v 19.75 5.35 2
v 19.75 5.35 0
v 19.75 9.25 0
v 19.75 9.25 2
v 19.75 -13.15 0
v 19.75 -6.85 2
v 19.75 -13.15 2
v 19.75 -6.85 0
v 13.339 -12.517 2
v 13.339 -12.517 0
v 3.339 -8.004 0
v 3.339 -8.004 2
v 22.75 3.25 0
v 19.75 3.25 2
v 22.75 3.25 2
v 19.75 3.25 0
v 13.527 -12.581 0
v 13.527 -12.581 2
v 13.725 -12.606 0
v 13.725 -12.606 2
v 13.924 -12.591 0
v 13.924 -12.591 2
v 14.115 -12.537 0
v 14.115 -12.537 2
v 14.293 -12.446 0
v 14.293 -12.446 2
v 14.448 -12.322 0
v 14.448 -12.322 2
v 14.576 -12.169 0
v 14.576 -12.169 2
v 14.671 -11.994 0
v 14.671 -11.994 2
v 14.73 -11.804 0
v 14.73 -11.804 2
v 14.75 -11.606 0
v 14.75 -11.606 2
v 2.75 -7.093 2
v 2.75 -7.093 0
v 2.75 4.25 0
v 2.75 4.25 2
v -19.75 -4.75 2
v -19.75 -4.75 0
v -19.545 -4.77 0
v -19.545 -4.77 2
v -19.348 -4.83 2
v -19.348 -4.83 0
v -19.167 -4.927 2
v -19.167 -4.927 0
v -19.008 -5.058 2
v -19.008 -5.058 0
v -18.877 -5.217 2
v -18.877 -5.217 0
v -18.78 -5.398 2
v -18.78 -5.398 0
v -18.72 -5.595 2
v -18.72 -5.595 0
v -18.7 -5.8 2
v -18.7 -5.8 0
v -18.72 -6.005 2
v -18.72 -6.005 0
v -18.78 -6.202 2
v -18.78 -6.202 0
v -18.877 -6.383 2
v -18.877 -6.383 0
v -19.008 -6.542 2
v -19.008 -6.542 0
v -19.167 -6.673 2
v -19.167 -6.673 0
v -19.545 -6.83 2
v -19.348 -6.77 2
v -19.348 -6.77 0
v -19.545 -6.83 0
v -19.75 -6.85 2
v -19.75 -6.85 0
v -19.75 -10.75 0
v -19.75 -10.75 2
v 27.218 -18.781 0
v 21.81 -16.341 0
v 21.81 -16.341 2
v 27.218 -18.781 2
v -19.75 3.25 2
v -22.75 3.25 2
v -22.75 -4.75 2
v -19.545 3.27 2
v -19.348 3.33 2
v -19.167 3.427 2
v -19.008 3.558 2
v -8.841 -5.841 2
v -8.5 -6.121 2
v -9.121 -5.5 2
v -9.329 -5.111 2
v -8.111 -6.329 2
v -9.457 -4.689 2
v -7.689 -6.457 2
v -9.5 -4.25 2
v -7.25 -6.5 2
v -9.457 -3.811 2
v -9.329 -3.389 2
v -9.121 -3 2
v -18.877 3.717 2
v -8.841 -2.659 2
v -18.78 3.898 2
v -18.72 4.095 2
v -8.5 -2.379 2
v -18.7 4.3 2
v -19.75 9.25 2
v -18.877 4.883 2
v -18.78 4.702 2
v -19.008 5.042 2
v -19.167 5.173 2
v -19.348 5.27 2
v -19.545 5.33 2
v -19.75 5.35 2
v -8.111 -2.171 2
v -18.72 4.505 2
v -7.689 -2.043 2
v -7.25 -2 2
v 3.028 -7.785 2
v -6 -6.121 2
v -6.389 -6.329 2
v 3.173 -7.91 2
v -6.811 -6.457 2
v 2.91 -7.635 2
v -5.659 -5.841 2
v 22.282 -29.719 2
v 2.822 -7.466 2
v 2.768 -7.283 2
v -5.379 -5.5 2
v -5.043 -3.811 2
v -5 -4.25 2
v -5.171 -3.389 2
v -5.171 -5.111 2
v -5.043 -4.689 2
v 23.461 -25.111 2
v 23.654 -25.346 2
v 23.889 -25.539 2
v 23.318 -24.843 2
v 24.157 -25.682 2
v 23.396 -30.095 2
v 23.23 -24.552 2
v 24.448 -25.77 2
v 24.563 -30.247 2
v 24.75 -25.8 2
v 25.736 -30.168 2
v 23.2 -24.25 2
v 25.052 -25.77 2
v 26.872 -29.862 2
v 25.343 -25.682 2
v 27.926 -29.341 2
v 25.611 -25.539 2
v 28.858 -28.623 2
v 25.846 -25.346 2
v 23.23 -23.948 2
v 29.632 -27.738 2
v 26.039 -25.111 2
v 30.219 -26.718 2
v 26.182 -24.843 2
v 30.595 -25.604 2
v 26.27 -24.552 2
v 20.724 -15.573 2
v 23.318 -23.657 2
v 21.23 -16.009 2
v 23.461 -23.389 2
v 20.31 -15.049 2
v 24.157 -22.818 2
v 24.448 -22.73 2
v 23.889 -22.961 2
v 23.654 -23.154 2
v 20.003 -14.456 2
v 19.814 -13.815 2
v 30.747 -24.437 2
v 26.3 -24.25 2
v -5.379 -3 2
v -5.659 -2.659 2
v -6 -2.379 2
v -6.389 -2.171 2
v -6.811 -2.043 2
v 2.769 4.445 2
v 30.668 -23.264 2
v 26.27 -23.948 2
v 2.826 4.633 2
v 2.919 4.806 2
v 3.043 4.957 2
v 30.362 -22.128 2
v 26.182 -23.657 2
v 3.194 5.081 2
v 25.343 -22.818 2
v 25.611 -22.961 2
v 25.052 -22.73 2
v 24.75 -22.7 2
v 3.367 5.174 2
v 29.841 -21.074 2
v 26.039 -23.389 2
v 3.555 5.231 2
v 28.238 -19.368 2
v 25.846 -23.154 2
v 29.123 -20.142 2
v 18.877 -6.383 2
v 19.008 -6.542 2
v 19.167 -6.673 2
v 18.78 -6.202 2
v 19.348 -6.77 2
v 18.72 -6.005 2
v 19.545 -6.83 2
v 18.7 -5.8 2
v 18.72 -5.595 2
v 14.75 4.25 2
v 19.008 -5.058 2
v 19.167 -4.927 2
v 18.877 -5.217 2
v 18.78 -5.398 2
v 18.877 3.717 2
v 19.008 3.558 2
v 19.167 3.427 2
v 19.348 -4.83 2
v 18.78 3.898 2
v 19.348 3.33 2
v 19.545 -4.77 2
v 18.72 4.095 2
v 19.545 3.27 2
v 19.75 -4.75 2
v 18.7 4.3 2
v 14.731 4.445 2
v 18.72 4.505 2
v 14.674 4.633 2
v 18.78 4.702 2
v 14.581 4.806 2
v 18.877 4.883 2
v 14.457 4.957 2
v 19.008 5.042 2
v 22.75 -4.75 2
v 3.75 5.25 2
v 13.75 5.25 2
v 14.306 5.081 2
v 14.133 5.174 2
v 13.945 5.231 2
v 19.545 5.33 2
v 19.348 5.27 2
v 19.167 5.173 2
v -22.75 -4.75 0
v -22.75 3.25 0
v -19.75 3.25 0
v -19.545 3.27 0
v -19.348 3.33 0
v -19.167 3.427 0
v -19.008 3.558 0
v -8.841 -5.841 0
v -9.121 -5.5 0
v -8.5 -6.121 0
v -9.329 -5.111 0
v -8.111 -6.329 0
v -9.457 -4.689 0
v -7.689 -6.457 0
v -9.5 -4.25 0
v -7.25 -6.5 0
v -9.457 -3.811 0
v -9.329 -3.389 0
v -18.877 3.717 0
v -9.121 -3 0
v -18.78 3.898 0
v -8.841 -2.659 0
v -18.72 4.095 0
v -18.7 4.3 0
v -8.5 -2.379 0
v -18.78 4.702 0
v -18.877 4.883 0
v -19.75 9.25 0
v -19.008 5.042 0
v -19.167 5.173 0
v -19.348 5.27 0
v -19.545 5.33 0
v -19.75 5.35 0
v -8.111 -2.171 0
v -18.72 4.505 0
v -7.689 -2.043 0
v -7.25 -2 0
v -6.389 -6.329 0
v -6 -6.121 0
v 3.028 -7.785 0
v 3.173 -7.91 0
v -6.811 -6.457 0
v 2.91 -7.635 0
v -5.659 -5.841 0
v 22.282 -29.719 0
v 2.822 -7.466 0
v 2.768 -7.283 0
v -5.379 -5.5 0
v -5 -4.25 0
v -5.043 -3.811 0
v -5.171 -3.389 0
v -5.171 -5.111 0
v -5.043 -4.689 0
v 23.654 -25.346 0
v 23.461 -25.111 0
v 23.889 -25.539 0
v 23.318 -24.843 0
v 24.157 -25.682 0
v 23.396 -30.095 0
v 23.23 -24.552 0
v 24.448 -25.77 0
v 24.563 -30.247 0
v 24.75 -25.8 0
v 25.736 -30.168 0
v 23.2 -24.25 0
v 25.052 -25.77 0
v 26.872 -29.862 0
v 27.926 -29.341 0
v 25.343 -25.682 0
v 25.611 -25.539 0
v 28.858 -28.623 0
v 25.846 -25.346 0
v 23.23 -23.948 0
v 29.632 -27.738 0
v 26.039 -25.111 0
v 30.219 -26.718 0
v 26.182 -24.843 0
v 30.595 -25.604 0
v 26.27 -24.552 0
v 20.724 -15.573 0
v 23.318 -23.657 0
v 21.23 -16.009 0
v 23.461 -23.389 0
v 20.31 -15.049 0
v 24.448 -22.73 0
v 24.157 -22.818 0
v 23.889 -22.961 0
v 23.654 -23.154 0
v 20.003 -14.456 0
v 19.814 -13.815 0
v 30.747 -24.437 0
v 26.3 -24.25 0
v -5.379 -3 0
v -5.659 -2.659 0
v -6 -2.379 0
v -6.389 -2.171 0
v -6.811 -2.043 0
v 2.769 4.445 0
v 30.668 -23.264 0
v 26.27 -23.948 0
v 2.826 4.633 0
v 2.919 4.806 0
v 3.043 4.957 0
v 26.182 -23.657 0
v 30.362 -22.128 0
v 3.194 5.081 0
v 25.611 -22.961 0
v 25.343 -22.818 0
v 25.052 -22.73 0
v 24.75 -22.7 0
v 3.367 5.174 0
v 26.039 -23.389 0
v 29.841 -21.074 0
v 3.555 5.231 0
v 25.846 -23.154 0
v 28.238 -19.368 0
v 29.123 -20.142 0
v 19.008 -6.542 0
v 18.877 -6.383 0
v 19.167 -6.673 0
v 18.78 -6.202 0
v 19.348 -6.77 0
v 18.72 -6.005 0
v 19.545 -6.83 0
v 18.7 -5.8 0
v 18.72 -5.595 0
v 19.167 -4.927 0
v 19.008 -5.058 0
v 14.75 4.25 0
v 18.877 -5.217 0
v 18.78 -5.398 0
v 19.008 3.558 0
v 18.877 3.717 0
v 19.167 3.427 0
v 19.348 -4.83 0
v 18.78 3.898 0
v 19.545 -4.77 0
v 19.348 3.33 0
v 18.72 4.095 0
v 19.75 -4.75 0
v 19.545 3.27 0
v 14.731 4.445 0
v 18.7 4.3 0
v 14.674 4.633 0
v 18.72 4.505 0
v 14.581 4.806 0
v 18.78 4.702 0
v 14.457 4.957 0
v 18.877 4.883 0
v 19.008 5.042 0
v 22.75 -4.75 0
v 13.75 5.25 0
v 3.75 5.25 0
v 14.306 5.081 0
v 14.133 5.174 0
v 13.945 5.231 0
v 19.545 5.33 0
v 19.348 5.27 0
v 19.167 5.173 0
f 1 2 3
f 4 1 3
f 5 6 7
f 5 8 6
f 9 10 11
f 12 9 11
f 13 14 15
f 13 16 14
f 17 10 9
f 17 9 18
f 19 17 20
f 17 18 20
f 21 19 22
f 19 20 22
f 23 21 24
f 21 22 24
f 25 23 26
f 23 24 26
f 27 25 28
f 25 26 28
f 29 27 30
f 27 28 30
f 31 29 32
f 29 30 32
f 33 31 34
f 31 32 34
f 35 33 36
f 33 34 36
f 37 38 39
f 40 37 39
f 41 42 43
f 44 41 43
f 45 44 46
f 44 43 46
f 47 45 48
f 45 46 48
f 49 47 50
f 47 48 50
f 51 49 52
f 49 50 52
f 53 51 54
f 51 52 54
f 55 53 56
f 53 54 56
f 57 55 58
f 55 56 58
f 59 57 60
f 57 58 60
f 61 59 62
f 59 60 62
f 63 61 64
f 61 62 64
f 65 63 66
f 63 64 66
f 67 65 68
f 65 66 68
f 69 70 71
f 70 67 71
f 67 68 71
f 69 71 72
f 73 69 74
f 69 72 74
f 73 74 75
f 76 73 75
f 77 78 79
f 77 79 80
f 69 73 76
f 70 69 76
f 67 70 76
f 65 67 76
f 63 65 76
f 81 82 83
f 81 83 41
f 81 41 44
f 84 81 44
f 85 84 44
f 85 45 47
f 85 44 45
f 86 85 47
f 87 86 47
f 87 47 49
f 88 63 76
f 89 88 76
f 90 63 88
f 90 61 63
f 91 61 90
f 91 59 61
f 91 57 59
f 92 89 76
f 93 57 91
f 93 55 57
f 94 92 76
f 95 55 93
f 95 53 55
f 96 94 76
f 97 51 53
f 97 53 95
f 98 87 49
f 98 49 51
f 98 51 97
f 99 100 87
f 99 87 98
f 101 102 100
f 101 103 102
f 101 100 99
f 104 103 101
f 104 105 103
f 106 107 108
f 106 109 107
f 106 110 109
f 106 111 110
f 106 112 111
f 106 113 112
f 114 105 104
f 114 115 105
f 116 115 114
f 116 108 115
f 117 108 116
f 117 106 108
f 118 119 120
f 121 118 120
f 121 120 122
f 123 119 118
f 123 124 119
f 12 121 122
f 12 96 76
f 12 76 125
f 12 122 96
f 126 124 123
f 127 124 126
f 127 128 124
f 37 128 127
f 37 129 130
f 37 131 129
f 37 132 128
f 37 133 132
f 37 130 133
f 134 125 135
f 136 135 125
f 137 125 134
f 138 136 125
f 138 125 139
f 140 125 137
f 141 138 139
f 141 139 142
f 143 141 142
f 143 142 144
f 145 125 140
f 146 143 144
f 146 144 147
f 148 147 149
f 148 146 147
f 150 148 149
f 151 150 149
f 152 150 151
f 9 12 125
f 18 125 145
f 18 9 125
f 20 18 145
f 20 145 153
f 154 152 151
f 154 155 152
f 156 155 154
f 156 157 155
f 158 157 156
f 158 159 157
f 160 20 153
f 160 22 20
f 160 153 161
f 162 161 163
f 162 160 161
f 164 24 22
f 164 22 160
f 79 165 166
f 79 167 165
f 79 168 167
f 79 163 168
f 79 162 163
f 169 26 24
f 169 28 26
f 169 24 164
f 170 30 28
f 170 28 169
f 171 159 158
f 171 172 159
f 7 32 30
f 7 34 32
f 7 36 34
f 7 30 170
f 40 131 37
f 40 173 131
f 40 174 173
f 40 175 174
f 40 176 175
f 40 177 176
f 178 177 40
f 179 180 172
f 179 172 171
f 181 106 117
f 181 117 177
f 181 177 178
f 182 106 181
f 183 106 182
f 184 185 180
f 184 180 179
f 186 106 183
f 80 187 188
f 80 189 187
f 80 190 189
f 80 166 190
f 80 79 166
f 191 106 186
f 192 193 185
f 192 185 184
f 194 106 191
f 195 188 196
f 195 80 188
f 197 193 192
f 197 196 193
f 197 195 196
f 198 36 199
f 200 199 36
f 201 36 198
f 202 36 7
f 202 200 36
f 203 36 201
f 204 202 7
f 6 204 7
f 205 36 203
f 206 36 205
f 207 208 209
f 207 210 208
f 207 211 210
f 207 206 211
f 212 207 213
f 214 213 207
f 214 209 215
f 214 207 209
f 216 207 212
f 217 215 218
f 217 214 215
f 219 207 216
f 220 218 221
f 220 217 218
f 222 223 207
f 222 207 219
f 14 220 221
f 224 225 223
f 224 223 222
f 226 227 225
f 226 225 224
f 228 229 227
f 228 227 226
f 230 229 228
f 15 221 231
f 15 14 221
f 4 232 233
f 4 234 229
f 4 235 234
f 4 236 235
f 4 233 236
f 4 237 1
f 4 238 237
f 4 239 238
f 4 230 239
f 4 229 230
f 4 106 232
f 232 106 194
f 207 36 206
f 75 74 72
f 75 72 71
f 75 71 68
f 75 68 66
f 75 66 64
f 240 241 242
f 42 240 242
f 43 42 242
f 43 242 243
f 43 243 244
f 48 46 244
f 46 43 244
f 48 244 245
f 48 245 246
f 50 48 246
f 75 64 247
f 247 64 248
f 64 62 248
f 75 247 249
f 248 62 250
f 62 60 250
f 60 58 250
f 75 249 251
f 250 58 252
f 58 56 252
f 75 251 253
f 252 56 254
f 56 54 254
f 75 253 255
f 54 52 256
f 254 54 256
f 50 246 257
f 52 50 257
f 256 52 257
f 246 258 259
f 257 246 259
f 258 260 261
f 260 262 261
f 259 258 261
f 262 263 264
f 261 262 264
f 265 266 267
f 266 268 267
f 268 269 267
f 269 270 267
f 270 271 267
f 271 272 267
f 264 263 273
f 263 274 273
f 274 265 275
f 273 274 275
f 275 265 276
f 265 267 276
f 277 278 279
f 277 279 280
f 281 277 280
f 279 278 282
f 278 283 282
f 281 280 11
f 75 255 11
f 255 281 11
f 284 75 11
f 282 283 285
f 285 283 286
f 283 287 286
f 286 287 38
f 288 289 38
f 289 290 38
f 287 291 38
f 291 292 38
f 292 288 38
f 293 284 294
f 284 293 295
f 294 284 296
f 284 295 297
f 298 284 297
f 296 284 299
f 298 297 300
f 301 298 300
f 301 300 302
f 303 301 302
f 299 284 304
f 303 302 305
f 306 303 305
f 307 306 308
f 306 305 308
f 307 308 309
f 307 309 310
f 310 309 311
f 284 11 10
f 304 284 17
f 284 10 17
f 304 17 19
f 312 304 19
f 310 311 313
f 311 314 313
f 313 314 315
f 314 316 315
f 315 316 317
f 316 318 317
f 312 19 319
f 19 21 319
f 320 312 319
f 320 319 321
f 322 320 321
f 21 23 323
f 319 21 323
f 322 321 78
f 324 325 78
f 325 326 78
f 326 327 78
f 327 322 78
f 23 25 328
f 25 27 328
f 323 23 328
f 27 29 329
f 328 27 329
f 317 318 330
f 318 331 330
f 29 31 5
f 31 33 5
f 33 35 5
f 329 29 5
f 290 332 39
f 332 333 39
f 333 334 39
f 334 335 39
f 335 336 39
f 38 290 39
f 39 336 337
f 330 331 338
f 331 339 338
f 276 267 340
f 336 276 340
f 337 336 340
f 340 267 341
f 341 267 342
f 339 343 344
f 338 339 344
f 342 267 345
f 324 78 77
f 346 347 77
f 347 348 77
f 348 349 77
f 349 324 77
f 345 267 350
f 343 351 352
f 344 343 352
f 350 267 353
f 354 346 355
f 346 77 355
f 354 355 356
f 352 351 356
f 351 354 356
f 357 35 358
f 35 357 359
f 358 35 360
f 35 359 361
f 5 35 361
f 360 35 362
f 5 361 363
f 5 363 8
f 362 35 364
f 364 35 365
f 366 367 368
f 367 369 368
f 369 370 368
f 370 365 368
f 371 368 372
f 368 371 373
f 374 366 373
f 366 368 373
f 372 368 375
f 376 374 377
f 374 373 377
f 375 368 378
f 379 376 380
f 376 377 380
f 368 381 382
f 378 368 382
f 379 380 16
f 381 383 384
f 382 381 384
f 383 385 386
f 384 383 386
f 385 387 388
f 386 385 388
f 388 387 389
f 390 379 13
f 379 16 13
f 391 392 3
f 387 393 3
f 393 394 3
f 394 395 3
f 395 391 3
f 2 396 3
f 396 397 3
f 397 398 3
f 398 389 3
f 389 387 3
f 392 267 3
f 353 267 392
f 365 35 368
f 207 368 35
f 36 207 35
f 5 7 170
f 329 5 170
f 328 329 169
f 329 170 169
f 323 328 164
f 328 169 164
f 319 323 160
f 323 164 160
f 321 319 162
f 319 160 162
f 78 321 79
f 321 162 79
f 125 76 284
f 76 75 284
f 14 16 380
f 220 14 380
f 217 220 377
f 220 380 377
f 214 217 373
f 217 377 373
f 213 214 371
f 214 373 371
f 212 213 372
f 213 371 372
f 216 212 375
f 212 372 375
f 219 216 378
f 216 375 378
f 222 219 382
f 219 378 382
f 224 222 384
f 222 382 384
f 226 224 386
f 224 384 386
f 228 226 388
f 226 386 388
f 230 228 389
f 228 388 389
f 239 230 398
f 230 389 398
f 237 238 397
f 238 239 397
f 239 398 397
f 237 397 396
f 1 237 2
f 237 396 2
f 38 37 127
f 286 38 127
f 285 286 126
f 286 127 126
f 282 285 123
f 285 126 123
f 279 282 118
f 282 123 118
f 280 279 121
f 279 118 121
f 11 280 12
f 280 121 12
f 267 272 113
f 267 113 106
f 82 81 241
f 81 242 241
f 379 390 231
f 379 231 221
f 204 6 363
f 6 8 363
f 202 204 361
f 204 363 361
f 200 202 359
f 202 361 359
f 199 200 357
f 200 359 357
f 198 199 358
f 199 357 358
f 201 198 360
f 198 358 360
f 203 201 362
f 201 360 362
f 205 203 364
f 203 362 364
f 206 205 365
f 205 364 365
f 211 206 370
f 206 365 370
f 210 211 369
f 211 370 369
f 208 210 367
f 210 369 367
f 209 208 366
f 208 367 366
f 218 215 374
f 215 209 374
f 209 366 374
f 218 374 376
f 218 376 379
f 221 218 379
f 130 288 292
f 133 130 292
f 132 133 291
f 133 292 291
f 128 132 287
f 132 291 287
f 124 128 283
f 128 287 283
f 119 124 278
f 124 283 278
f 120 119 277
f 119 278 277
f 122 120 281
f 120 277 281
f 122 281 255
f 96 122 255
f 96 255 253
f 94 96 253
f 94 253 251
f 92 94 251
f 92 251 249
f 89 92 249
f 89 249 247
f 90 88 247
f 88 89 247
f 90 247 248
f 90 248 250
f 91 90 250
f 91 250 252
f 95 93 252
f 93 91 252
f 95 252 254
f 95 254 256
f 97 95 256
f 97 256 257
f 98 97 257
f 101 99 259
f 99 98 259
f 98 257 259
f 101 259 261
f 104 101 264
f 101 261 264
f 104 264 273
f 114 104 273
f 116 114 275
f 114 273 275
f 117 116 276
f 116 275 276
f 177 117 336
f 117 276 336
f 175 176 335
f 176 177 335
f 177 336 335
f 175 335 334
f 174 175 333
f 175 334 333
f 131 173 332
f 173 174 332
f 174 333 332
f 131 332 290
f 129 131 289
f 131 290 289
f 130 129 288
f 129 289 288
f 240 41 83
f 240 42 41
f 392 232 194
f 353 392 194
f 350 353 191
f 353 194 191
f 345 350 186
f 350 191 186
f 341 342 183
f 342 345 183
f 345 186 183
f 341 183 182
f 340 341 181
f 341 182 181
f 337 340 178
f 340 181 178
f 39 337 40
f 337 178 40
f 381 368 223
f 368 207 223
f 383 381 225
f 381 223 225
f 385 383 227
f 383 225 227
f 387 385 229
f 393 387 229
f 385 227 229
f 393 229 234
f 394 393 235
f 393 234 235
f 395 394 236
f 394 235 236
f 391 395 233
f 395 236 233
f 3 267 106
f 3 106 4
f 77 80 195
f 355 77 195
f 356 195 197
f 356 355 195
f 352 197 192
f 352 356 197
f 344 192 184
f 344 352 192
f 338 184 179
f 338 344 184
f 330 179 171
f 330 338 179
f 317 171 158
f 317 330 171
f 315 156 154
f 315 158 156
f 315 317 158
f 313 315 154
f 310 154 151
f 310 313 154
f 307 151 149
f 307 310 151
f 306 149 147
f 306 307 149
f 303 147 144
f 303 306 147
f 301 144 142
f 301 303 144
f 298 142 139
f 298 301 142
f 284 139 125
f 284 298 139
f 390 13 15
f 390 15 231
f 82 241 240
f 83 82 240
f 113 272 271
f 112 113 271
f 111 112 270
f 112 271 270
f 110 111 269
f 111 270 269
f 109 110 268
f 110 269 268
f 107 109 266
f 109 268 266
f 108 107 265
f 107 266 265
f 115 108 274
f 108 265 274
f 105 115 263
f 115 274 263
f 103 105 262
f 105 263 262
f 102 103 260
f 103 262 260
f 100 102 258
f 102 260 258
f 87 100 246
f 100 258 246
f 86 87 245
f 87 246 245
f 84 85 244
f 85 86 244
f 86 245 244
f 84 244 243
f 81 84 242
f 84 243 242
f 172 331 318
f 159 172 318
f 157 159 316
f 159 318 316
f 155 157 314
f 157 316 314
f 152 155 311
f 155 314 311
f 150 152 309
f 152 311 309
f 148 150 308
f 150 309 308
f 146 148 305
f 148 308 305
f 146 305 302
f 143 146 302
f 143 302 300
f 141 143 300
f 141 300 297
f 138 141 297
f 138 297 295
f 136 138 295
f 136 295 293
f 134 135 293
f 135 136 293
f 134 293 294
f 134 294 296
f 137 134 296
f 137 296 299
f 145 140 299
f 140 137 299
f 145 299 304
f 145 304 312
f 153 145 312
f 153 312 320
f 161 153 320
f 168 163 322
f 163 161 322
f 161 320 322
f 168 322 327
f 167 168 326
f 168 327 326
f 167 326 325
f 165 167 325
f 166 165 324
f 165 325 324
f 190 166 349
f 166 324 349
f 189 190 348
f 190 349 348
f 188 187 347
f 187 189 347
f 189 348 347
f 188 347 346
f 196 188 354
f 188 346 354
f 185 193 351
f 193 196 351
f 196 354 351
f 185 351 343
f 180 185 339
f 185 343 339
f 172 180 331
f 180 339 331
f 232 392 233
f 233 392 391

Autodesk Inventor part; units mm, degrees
ref_plane "YZ Plane" through (0, 0, 0) normal (1, 0, 0) x (0, 1, 0)
ref_plane "XZ Plane" through (0, 0, 0) normal (0, 1, 0) x (-1, 0, 0)
ref_plane "XY Plane" through (0, 0, 0) normal (0, 0, 1) x (1, 0, 0)
sketch "スケッチ1" plane through (0, 0, 0) normal (0, 0, 1) x (1, 0, 0)
  line L0 (-19.75, 25.75) -> (19.75, 25.75) construction
  line L1 (19.75, 25.75) -> (19.75, -25.75) construction
  line L2 (19.75, -25.75) -> (-19.75, -25.75) construction
  line L3 (-19.75, -25.75) -> (-19.75, 25.75) construction
  line L4 (-19.75, 25.75) -> (19.75, -25.75) construction
  line L5 (19.75, 25.75) -> (-19.75, -25.75) construction
  circle A0 centre (24.75, -24.25) radius 1.55
  circle A1 centre (-7.25, -4.25) radius 2.25
  line L6 (0, 25.75) -> (0, -25.75) construction
  line L7 (-19.75, 3.25) -> (-22.75, 3.25)
  line L8 (-22.75, 3.25) -> (-22.75, -4.75)
  arc A2 (-19.75, 3.25) -> (-19.75, 5.35) centre (-19.75, 4.3) ccw
  line L9 (-22.75, -0.75) -> (-19.75, -0.75) construction
  line L10 (-19.75, -4.75) -> (-22.75, -4.75)
  arc A3 (-19.75, -6.85) -> (-19.75, -4.75) centre (-19.75, -5.8) ccw
  line L11 (-19.75, 5.35) -> (-19.75, 9.25)
  line L12 (-19.75, 9.25) -> (19.75, 9.25)
  arc A4 (19.75, 5.35) -> (19.75, 3.25) centre (19.75, 4.3) ccw
  arc A5 (19.75, -4.75) -> (19.75, -6.85) centre (19.75, -5.8) ccw
  line L13 (19.75, 5.35) -> (19.75, 9.25)
  arc A6 (22.2819, -29.7189) -> (27.2181, -18.7811) centre (24.75, -24.25) ccw
  line L14 (-19.75, -6.85) -> (-19.75, -10.75)
  line L15 (-19.75, -10.75) -> (22.2819, -29.7189)
  line L16 (19.75, -6.85) -> (19.75, -15.4108)
  line L17 (19.75, -15.4108) -> (27.2181, -18.7811)
  circle A7 centre (-7.25, -4.25) radius 6 construction
  circle A8 centre (24.75, -24.25) radius 6 construction
  line L18 (2.75, 5.25) -> (14.75, 5.25)
  line L19 (14.75, 5.25) -> (14.75, -13.1543)
  line L20 (14.75, -13.1543) -> (2.75, -7.7388)
  line L21 (2.75, -7.7388) -> (2.75, 5.25)
  line L22 (19.75, 3.25) -> (22.75, 3.25)
  line L23 (22.75, 3.25) -> (22.75, -4.75)
  line L24 (22.75, -4.75) -> (19.75, -4.75)
  point P0 (0, 0)
  dimension "d0" = 39.5
  dimension "d1" = 51.5
  dimension "d2" = 3.1
  dimension "d3" = 4.5
  dimension "d4" = 32
  dimension "d5" = 20
  dimension "d6" = 3
  dimension "d7" = 1.05
  dimension "d8" = 8
  dimension "d9" = 26.5
  dimension "d11" = 30
  dimension "d12" = 12.5
  dimension "d13" = 6
  dimension "d14" = 12
  dimension "d19" = 12
  dimension "d20" = 12
  dimension "d21" = 4
  dimension "d22" = 5
  dimension "d24" = 4
  dimension "d26" = 3
extrude "押し出し1" add sketch "スケッチ1" along normal blind 2
fillet "フィレット1" radius 3.5 1 edges at (19.75, -15.4108, 1)
fillet "フィレット2" radius 1 4 edges at (2.75, 5.25, 1) (14.75, 5.25, 1) (2.75, -7.7388, 1) (14.75, -13.1543, 1)
equation "\"d24\" = d21"
properties part number "Leg_joint_pitch_frame" material "アルミニウム 2014-T4"
